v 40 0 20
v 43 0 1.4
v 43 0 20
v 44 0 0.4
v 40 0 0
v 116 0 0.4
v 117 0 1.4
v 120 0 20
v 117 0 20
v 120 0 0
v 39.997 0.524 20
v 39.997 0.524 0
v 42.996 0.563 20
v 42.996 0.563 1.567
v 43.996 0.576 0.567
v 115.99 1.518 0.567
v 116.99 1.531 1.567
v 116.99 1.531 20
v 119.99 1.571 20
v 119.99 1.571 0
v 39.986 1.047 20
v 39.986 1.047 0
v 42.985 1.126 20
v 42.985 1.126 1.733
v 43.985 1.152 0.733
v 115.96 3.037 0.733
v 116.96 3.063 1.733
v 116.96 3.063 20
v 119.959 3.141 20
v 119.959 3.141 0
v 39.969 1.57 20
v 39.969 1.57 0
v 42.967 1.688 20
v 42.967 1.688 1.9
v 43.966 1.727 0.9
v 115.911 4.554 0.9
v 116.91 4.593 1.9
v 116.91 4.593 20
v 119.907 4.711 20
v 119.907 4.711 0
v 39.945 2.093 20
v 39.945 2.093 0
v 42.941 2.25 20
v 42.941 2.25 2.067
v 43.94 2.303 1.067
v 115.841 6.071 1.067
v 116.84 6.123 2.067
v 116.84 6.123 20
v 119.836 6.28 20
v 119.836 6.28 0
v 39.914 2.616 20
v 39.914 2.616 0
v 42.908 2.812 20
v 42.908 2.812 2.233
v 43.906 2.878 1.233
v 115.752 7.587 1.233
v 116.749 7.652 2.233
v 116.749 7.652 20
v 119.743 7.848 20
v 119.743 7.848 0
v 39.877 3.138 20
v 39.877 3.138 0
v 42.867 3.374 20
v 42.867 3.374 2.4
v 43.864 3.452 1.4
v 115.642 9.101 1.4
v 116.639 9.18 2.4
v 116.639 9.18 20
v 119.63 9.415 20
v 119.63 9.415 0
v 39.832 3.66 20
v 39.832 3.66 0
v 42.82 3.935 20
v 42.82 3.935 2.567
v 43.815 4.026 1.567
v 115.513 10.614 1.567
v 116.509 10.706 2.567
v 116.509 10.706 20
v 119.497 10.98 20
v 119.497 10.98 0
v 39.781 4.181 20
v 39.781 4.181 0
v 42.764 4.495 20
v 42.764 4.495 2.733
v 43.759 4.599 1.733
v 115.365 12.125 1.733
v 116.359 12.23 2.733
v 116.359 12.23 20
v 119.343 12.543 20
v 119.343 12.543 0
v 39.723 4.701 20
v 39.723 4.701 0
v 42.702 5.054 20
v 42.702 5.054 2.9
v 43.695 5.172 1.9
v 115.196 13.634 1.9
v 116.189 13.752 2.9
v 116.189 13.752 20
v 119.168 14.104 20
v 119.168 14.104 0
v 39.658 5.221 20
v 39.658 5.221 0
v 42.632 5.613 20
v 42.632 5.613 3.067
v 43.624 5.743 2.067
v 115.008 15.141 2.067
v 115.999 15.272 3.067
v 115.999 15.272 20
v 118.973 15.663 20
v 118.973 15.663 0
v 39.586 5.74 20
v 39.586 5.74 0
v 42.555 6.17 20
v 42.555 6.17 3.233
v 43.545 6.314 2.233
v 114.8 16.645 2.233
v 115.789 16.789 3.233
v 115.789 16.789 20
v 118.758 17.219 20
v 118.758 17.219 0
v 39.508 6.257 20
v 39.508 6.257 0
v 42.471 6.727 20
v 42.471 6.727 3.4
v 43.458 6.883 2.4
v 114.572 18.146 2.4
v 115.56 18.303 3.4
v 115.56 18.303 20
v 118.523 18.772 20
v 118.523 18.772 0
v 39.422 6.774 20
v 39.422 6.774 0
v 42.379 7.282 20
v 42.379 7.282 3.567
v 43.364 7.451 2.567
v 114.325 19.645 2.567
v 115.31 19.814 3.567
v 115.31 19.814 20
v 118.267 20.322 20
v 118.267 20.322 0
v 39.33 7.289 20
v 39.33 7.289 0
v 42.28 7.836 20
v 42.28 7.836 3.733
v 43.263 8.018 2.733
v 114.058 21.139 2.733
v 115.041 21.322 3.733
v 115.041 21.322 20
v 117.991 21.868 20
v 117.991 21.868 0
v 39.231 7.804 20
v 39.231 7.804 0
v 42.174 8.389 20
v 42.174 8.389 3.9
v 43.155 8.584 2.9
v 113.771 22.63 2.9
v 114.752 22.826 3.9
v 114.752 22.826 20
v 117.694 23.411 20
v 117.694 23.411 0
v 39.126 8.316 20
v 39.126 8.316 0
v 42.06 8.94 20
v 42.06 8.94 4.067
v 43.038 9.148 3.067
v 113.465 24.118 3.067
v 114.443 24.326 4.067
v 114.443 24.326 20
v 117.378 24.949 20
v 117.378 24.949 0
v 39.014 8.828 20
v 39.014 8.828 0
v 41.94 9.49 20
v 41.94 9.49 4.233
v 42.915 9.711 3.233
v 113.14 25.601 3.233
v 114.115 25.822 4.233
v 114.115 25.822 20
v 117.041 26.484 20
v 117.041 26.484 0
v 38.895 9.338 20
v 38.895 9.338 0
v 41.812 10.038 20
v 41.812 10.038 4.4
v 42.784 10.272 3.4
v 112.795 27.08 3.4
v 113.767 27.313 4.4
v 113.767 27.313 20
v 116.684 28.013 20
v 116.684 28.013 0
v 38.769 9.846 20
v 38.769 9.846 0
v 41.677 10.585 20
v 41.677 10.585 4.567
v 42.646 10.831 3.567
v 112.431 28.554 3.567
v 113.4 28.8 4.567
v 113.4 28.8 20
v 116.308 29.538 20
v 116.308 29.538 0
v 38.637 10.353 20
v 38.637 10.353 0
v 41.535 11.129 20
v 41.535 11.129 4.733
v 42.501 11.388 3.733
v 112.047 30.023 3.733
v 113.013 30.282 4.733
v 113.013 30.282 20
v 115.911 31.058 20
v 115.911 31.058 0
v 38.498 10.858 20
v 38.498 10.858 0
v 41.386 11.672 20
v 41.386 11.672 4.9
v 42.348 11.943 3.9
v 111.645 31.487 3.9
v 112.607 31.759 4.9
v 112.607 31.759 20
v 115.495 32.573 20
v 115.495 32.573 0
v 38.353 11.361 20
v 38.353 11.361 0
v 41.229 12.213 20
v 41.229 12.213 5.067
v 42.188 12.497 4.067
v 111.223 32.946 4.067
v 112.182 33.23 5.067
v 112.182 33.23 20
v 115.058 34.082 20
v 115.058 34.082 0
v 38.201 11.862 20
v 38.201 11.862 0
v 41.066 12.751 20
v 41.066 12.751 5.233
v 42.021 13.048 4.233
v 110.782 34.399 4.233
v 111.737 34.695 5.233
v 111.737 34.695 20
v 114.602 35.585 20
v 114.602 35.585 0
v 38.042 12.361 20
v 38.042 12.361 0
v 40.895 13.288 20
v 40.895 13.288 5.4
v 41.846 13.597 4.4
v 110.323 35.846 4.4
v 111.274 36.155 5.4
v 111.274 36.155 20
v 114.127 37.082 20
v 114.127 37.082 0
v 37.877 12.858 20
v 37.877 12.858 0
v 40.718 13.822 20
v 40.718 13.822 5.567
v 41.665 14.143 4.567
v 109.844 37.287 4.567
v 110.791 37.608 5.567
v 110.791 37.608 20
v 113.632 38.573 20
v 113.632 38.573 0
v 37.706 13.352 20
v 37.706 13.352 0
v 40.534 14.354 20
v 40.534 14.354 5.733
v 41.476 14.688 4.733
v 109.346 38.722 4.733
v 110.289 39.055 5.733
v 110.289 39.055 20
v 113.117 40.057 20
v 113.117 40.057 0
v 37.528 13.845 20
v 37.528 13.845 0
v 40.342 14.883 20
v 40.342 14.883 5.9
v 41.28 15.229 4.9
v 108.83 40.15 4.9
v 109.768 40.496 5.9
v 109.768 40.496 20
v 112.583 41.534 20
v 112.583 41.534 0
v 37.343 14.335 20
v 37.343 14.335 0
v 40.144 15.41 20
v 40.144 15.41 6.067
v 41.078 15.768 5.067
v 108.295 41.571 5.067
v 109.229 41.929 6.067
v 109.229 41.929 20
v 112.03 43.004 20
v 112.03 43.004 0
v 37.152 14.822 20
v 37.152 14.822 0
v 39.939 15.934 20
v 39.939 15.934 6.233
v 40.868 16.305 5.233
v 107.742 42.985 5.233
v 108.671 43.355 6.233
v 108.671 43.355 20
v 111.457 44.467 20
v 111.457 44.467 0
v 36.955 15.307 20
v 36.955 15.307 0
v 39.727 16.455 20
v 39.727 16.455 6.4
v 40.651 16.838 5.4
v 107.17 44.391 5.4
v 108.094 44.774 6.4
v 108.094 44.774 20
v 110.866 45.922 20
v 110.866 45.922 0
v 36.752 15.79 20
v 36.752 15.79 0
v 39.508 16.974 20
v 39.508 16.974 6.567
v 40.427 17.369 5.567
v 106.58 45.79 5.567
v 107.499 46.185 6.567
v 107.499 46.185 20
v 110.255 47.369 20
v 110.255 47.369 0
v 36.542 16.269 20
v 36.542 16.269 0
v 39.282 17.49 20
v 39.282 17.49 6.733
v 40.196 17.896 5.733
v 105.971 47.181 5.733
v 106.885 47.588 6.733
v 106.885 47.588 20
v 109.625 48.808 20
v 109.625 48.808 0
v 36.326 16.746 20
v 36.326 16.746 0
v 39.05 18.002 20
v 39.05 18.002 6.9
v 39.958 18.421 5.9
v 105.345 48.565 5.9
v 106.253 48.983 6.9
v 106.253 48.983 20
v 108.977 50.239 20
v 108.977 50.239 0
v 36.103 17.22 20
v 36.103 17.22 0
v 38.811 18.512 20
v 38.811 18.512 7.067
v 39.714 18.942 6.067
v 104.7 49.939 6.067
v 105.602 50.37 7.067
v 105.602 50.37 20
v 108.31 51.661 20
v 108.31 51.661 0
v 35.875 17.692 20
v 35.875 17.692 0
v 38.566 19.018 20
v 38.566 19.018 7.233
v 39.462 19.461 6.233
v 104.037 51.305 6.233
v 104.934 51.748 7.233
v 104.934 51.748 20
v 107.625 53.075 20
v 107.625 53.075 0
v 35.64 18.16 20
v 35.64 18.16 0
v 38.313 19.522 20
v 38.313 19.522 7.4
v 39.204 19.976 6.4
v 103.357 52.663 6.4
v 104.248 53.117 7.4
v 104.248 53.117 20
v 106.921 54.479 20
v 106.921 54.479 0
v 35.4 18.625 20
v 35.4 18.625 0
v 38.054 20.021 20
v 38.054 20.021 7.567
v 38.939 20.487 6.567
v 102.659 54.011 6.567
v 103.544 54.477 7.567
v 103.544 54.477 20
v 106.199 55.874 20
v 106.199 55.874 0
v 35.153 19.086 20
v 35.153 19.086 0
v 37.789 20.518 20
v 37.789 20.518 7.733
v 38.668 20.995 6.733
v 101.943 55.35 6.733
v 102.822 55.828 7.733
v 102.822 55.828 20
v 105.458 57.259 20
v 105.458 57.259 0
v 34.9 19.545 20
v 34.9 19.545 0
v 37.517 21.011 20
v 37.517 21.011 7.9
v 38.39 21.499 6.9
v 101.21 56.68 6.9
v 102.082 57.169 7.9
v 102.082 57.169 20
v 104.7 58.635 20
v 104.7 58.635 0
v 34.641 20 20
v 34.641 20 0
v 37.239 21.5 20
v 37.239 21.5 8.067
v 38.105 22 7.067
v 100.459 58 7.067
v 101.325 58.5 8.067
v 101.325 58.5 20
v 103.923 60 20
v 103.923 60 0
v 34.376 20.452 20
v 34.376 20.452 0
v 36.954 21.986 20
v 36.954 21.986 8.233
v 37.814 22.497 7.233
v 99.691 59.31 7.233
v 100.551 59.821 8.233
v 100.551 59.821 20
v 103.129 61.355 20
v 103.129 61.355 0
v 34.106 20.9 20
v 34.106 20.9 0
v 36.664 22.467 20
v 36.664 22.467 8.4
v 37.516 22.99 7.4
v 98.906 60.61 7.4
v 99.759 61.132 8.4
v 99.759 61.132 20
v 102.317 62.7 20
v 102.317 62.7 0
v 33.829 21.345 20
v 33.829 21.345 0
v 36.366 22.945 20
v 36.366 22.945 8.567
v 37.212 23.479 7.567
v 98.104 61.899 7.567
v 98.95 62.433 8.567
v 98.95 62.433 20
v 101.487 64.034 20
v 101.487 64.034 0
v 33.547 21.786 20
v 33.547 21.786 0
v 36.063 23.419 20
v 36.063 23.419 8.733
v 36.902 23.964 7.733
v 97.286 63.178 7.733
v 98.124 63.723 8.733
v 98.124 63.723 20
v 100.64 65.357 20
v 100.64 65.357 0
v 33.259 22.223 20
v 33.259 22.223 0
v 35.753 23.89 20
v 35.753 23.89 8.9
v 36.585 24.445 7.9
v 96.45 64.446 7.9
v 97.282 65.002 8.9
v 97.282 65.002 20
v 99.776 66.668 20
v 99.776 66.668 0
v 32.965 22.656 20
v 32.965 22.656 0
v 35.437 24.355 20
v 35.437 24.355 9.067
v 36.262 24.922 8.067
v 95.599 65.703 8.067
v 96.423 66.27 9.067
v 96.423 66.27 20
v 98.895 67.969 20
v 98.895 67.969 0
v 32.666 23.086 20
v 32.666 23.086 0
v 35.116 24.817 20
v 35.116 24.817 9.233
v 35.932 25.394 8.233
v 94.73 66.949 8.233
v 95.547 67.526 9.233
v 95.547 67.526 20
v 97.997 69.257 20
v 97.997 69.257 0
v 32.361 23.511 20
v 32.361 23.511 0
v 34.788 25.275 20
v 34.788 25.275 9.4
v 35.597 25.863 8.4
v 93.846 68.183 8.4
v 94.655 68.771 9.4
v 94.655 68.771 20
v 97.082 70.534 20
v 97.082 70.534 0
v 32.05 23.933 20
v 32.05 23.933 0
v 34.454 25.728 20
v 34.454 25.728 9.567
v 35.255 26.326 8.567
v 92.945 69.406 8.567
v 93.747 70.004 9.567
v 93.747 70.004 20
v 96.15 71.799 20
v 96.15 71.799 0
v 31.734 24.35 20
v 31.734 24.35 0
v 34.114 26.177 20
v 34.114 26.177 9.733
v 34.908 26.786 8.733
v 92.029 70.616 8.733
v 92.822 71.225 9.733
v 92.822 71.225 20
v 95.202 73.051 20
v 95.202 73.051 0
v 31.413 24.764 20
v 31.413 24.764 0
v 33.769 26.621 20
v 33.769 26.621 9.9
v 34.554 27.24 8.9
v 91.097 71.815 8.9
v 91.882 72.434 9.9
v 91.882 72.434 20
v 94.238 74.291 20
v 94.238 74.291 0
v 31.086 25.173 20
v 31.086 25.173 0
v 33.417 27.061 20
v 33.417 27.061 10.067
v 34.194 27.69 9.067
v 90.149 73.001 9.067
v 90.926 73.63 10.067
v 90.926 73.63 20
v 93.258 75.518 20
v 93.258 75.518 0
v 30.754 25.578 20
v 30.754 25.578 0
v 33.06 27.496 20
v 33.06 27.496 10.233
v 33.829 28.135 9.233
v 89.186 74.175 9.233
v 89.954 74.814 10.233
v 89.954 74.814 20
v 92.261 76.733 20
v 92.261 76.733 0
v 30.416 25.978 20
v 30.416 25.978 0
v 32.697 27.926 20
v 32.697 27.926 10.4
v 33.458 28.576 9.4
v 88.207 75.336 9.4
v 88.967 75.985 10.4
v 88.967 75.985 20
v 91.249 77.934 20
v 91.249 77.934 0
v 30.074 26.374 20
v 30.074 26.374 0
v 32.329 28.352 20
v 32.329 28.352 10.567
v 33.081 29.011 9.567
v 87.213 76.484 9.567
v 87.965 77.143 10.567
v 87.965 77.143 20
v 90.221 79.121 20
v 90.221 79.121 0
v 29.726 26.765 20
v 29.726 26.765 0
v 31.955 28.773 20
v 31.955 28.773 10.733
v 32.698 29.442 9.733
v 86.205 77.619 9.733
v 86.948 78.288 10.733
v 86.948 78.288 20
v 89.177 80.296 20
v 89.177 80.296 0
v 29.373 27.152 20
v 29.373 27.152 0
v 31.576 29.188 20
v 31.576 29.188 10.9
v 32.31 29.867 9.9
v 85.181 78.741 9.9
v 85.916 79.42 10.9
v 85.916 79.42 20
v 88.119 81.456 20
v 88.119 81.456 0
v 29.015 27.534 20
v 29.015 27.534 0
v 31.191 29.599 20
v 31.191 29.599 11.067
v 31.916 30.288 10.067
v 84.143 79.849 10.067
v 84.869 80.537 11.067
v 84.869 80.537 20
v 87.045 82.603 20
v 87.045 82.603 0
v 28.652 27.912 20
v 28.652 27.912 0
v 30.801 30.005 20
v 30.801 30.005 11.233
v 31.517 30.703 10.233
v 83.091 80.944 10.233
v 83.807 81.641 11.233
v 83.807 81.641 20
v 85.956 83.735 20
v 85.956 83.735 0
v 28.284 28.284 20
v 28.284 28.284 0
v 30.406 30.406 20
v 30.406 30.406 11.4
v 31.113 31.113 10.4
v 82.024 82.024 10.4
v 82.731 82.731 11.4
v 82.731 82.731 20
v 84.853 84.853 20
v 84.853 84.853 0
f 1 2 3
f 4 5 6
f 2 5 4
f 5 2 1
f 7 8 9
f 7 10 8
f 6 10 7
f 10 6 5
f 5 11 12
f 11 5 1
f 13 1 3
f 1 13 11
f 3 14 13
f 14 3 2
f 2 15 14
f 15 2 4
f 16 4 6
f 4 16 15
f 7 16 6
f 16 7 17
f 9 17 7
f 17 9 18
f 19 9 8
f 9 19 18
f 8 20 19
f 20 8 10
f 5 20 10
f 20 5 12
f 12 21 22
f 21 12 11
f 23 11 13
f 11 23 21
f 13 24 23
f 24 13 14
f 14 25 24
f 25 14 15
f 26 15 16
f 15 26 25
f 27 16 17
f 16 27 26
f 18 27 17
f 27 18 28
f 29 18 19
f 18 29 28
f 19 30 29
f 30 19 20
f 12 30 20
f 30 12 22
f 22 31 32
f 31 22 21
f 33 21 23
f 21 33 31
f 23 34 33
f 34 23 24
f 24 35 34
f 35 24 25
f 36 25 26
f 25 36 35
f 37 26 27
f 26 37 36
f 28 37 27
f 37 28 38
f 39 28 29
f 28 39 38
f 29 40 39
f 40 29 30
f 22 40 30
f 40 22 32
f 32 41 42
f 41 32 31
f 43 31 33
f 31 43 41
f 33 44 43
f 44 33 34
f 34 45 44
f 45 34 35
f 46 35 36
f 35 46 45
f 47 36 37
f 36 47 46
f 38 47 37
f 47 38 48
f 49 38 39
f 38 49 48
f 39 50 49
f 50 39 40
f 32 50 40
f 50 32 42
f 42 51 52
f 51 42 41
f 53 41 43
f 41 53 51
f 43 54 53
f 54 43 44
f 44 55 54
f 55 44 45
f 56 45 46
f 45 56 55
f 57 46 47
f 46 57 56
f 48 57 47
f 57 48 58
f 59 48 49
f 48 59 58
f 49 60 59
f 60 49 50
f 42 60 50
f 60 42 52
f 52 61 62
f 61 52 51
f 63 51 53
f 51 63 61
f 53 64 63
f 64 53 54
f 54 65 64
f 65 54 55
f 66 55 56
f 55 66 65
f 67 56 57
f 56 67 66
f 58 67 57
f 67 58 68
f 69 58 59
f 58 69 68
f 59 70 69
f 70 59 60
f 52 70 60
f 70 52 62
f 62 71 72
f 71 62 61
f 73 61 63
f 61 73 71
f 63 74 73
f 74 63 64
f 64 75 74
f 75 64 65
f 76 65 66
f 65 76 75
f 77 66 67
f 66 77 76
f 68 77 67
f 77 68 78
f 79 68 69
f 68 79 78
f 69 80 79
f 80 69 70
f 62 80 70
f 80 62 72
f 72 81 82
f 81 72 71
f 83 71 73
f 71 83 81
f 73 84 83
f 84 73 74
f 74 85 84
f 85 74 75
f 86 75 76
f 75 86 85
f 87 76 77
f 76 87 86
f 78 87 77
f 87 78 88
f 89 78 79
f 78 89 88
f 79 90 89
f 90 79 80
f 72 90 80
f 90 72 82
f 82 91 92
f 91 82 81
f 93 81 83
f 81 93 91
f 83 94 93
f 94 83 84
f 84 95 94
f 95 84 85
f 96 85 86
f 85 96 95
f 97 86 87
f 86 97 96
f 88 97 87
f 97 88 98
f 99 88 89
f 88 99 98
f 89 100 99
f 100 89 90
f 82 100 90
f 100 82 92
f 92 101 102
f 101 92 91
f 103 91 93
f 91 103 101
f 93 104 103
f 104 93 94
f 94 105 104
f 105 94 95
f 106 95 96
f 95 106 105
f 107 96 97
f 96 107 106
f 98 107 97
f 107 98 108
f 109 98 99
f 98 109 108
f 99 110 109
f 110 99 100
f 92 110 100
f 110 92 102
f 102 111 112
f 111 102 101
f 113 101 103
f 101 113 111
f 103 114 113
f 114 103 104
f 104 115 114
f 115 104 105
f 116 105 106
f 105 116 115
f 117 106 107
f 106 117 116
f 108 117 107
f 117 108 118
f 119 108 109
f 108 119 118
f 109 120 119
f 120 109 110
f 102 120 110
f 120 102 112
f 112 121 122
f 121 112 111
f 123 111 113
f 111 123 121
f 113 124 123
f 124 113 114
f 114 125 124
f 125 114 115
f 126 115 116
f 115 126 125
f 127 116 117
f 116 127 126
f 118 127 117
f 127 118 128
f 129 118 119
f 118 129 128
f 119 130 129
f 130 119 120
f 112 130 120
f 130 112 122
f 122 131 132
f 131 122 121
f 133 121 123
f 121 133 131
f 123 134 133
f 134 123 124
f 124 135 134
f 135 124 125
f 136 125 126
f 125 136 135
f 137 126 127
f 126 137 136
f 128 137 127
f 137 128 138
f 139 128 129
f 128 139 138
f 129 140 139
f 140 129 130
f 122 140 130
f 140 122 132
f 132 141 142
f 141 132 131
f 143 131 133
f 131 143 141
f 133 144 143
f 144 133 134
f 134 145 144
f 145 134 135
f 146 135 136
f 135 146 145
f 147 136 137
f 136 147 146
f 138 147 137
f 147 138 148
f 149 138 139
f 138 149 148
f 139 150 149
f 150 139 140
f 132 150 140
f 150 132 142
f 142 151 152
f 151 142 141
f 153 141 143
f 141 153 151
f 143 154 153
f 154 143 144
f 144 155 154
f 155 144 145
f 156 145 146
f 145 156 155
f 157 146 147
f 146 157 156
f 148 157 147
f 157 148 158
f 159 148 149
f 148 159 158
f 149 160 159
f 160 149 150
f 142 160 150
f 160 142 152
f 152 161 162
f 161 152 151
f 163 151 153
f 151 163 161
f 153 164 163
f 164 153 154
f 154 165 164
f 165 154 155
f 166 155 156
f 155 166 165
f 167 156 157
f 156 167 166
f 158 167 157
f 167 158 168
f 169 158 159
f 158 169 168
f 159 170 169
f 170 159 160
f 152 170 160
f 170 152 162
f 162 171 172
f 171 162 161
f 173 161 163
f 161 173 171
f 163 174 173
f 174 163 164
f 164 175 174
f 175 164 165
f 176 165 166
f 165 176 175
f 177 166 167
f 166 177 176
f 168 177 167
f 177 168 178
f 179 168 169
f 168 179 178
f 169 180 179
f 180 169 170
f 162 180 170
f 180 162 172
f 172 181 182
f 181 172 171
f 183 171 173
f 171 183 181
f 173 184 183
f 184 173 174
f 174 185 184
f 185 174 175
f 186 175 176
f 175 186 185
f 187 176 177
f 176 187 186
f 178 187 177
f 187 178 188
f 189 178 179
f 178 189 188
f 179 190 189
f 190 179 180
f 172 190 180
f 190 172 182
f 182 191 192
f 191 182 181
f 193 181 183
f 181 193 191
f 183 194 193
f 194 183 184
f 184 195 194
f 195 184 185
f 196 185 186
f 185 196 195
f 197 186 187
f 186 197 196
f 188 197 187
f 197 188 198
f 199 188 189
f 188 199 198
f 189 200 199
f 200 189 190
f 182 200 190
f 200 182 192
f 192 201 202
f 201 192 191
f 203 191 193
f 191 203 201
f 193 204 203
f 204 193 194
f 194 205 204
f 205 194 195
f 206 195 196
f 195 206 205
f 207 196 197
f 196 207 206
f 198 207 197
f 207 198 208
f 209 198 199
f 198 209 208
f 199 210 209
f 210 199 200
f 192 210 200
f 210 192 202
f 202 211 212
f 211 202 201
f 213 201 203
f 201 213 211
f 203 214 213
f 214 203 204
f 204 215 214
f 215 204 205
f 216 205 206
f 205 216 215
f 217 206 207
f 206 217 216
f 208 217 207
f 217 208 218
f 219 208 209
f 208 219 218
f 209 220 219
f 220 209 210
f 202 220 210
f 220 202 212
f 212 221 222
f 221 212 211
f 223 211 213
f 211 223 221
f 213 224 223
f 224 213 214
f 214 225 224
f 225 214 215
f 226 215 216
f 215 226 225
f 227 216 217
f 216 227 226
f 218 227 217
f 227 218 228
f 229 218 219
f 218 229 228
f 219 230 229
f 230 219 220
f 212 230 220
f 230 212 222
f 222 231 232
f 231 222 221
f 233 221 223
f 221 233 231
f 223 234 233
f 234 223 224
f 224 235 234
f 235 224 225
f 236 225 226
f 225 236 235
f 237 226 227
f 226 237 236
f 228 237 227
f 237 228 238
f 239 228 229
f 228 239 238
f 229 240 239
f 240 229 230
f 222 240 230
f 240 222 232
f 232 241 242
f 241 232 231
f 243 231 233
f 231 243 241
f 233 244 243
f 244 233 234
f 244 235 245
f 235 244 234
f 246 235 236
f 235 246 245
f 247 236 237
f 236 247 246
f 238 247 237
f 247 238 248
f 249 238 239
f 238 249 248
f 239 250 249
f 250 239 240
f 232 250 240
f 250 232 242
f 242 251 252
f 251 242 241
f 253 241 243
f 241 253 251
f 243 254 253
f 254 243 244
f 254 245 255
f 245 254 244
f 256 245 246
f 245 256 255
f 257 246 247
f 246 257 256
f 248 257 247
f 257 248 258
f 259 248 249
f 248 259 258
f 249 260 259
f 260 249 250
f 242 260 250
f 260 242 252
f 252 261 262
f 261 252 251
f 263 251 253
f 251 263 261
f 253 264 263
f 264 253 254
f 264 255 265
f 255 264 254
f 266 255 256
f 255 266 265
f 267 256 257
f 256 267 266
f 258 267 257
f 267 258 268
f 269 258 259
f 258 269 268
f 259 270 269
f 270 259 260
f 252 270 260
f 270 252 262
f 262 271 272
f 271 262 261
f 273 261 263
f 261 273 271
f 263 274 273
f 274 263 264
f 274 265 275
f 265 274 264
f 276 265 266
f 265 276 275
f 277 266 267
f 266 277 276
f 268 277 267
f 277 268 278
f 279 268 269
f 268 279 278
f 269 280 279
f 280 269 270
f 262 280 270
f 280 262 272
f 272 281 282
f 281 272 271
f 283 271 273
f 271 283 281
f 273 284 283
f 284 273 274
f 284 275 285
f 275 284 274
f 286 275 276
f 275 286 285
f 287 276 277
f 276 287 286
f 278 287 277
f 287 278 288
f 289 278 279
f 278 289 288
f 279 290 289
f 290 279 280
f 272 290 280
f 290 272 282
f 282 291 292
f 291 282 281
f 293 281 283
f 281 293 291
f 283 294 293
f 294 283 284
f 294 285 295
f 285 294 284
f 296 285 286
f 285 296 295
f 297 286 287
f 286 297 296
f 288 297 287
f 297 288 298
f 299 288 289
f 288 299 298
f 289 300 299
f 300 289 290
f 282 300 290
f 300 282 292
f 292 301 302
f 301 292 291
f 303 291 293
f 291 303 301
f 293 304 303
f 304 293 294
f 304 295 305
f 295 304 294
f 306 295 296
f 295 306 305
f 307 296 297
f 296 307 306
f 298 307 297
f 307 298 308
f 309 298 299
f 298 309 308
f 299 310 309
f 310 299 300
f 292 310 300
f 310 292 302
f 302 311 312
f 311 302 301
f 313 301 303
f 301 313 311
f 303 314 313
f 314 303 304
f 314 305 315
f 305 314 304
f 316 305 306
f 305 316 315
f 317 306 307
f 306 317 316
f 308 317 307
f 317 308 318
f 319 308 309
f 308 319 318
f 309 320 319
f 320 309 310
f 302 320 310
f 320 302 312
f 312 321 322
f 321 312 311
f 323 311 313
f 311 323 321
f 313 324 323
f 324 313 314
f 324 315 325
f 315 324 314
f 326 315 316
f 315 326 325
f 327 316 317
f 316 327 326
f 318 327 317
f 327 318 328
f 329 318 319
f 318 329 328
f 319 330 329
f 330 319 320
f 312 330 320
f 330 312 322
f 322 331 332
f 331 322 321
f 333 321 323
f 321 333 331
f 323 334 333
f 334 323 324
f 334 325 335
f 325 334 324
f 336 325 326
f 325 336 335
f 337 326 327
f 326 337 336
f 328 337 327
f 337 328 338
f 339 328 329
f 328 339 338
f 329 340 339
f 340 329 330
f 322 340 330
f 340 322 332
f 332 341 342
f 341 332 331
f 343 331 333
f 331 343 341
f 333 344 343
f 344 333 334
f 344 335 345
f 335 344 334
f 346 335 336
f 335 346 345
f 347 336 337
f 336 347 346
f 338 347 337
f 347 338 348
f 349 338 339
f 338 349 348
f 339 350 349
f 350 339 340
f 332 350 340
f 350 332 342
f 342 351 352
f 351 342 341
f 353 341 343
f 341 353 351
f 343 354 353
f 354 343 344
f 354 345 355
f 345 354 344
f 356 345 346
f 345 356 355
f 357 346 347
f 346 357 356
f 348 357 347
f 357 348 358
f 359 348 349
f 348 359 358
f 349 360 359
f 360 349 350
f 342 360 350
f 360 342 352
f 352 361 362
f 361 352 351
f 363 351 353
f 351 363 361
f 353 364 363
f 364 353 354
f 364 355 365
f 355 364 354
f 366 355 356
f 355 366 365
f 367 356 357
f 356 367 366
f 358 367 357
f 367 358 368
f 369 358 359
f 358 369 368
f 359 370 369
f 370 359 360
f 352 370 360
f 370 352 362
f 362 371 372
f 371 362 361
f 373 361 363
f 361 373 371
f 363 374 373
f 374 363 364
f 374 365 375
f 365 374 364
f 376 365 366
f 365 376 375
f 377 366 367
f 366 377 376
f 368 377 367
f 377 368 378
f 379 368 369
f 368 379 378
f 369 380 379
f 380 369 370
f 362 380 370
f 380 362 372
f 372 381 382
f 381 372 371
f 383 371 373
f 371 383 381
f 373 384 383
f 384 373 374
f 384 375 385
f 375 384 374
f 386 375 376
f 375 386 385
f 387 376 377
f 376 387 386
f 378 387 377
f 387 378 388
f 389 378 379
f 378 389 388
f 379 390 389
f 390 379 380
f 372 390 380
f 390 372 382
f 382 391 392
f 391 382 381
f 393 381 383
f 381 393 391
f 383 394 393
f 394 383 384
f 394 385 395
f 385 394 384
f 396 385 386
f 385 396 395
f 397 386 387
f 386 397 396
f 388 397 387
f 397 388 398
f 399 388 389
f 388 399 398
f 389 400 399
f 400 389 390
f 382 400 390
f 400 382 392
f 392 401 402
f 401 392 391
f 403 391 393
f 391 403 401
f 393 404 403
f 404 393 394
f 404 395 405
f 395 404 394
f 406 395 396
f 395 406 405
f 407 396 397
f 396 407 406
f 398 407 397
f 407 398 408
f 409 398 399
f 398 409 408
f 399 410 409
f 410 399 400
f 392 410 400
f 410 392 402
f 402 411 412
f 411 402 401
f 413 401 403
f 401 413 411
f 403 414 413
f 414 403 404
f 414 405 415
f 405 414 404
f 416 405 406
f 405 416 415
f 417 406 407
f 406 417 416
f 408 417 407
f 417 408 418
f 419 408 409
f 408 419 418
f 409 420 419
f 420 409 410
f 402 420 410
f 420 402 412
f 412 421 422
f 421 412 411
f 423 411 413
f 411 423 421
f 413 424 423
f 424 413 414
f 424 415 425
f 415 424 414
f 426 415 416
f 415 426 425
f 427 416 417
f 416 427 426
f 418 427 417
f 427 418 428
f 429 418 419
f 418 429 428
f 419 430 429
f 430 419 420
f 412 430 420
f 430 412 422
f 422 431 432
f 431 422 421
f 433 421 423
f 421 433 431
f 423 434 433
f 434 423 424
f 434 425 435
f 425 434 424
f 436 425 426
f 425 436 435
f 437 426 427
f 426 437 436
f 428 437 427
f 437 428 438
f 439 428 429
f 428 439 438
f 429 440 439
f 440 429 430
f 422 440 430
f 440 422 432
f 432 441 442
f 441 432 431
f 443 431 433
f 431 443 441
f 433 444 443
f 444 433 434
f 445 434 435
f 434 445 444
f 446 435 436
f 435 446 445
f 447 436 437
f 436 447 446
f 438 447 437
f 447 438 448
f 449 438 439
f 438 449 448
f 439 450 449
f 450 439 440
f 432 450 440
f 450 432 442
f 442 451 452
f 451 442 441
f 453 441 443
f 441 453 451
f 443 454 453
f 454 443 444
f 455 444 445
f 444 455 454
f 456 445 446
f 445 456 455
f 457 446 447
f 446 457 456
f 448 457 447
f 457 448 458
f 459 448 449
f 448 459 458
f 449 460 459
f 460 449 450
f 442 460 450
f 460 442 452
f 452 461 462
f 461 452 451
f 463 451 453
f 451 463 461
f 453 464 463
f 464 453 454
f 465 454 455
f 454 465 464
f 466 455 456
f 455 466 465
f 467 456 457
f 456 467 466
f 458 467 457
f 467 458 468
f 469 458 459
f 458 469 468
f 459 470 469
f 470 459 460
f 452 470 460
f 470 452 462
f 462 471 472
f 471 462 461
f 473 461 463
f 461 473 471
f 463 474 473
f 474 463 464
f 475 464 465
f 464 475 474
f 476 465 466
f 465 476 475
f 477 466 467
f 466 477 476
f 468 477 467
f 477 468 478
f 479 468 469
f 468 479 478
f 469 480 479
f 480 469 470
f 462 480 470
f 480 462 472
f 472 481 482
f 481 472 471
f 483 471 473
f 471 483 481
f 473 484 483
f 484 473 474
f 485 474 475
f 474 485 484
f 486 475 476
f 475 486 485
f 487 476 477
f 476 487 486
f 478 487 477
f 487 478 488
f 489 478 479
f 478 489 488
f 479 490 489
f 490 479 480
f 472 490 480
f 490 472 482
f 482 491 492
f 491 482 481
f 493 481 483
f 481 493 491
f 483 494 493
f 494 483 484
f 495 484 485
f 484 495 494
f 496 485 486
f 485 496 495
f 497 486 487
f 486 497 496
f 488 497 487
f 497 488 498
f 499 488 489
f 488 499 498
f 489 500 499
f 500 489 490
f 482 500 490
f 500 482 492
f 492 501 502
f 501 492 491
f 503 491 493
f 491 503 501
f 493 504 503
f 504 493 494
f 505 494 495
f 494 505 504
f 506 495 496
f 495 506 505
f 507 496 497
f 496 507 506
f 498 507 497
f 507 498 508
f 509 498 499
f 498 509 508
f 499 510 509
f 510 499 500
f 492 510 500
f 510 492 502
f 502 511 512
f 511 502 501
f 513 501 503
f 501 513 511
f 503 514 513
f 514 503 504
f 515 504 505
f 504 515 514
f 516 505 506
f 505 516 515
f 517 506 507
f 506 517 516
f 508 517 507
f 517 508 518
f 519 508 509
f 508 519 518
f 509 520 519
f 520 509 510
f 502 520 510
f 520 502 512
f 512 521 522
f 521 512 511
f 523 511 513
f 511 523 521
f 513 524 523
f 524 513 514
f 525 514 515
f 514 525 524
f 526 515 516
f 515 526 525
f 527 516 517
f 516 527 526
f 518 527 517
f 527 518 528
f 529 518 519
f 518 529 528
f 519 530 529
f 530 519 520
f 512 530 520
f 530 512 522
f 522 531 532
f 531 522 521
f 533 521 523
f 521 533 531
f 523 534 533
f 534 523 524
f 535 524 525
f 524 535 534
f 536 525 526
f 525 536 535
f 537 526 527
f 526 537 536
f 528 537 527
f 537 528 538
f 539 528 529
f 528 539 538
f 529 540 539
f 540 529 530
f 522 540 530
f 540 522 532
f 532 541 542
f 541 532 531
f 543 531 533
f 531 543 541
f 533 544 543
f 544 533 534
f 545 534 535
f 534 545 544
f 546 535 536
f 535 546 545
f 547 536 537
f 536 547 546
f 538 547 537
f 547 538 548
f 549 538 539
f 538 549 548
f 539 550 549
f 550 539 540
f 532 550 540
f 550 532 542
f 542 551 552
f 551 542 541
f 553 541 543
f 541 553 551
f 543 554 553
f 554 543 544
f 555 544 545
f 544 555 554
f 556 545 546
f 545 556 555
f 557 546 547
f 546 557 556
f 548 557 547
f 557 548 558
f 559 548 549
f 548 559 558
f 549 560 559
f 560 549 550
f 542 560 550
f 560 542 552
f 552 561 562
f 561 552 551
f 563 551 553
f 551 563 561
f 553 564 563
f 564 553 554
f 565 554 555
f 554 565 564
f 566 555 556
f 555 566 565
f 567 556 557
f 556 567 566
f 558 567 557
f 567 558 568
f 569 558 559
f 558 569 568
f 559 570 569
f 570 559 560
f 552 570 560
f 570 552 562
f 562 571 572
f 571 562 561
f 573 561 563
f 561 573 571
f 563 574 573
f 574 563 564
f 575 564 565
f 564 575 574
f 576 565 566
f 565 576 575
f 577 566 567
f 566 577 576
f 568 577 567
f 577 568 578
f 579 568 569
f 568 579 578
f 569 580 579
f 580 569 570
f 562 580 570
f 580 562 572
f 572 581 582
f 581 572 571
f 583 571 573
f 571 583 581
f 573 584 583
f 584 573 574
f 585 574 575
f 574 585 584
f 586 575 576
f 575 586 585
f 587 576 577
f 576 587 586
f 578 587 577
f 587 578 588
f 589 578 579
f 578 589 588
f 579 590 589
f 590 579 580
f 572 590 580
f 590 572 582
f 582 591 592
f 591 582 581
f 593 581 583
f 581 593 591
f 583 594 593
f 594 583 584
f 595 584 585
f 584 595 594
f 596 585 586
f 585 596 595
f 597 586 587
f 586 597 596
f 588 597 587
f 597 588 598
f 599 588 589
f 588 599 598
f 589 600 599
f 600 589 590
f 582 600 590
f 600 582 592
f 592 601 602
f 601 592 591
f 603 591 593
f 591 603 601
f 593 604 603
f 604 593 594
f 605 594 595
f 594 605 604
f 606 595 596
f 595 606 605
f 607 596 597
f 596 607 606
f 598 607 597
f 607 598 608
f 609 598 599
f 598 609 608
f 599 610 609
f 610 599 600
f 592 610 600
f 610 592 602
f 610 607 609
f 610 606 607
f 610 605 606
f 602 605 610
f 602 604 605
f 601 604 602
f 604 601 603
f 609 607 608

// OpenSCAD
SphereRadius = 36;

$fn = 72;

InnerRadius = 40;
InnerDepth = 3;
InnerHeight = 10;
RampWidth = SphereRadius*2 + 2;
MaxHeight = 10;
OuterHeight = 10;
OuterDepth = 3;

MaxAngle=45;
SliceAngle = 0.75;
Slices = MaxAngle/SliceAngle;


FixedCrossSection = [[InnerRadius, 0, 0],
                     [InnerRadius, MaxHeight+InnerHeight, 0],
                     [InnerRadius + InnerDepth, MaxHeight+InnerHeight, 0],           
                     [InnerRadius + InnerDepth,  1.4, 1],
                     [InnerRadius + InnerDepth+1,  0.4, 1],                       
                     [InnerRadius + InnerDepth + RampWidth-1, 0.4, 1],
                     [InnerRadius + InnerDepth + RampWidth, 1.4, 1],    
                     [InnerRadius + InnerDepth + RampWidth, MaxHeight+OuterHeight, 0],  
                     [InnerRadius + InnerDepth + RampWidth + OuterDepth,
                      MaxHeight+OuterHeight, 0],  
                     [InnerRadius + InnerDepth + RampWidth + OuterDepth, 0, 0]];

function Point(i) = [FixedCrossSection[i][0],
                     FixedCrossSection[i][1] + FixedCrossSection[i][2] * MaxHeight];


function Slice(angle, i) =
    let (dx = cos(angle) * FixedCrossSection[i][0])
    let (dy = sin(angle) * FixedCrossSection[i][0])
    let (h = MaxHeight * angle / MaxAngle)
        [dx, dy, FixedCrossSection[i][1] + FixedCrossSection[i][2] * h];
function Face(angle, i) =
    let (index = (angle/SliceAngle))
    let (s0 = index * len(FixedCrossSection))
    let (p0 = s0 + i)
    let (p1 = s0 + (i + 1) % len(FixedCrossSection))
    let (s1 = (index + 1) * len(FixedCrossSection))
    let (p2 = s1 + (i + 1) % len(FixedCrossSection))
    let (p3 = s1 + i)
    [p3,p2,p1,p0];
        
        
//polygon([for (i = [0:len(FixedCrossSection)-1]) Point(i)]);
p = [for (angle = [0:SliceAngle:MaxAngle])
        for (i = [0:len(FixedCrossSection)-1])
            Slice(angle, i)];
                
f = [[for (i = [0:len(FixedCrossSection)-1]) i],
     for (angle = [0:SliceAngle:MaxAngle-SliceAngle])
        for (i = [0:len(FixedCrossSection)-1])
            Face(angle, i),
      [for (i = [len(FixedCrossSection)-1:-1:0]) i + Slices*len(FixedCrossSection)]];
echo(p);

echo(f);

union() {
/*
difference() {
    translate([-(RampWidth+3), InnerRadius,0])
    cube([RampWidth+3,RampWidth+LidDepth+OuterDepth,MaxHeight+OuterHeight]);
    translate([-RampWidth, InnerRadius + LidDepth,3])
        cube([RampWidth,RampWidth,MaxHeight+OuterHeight+1]);
}
    */
polyhedron(
    points = p,
    faces = f,
    convexity = 10);
}
                  
                
    


module Arc(outerRadius, thickness, length, height)
{
    radius = outerRadius-thickness/2;
    innerRadius = outerRadius - thickness;
    translate([-radius,0,0]) {
        angle = length * 180 / (radius * 3.141592654);
        x = cos(angle) * radius;
        y = sin(angle) * radius;

        union() {
            translate([x,y,0])
                cylinder(r=thickness/2, h=height);
            translate([radius,0,0])
                cylinder(r=thickness/2, h=height);
            intersection() {
                HollowCylinder(innerRadius, outerRadius, height);

                translate([0,0,-1])
                    linear_extrude(height = height + 2)
                        polygon([[0,0],[2*radius,0],
                                 [2*radius,2*radius],
                                 if (angle > 90)
                                    [-2*radius,2*radius],
                                 if (angle > 180)
                                    [-2*radius,-2*radius],
                                 if (angle > 270)
                                    [2*radius,-2*radius],
                                 [2*x,2*y]]);
            }
        }
    }
}
module HollowCylinder(innerRadius, outerRadius, height)
{
    difference()
    {
        cylinder(r=outerRadius, h=height, $fn = 288);
        translate([0,0,-1])
            cylinder(r=innerRadius, h=height + 2, $fn = 288);
    }
}
